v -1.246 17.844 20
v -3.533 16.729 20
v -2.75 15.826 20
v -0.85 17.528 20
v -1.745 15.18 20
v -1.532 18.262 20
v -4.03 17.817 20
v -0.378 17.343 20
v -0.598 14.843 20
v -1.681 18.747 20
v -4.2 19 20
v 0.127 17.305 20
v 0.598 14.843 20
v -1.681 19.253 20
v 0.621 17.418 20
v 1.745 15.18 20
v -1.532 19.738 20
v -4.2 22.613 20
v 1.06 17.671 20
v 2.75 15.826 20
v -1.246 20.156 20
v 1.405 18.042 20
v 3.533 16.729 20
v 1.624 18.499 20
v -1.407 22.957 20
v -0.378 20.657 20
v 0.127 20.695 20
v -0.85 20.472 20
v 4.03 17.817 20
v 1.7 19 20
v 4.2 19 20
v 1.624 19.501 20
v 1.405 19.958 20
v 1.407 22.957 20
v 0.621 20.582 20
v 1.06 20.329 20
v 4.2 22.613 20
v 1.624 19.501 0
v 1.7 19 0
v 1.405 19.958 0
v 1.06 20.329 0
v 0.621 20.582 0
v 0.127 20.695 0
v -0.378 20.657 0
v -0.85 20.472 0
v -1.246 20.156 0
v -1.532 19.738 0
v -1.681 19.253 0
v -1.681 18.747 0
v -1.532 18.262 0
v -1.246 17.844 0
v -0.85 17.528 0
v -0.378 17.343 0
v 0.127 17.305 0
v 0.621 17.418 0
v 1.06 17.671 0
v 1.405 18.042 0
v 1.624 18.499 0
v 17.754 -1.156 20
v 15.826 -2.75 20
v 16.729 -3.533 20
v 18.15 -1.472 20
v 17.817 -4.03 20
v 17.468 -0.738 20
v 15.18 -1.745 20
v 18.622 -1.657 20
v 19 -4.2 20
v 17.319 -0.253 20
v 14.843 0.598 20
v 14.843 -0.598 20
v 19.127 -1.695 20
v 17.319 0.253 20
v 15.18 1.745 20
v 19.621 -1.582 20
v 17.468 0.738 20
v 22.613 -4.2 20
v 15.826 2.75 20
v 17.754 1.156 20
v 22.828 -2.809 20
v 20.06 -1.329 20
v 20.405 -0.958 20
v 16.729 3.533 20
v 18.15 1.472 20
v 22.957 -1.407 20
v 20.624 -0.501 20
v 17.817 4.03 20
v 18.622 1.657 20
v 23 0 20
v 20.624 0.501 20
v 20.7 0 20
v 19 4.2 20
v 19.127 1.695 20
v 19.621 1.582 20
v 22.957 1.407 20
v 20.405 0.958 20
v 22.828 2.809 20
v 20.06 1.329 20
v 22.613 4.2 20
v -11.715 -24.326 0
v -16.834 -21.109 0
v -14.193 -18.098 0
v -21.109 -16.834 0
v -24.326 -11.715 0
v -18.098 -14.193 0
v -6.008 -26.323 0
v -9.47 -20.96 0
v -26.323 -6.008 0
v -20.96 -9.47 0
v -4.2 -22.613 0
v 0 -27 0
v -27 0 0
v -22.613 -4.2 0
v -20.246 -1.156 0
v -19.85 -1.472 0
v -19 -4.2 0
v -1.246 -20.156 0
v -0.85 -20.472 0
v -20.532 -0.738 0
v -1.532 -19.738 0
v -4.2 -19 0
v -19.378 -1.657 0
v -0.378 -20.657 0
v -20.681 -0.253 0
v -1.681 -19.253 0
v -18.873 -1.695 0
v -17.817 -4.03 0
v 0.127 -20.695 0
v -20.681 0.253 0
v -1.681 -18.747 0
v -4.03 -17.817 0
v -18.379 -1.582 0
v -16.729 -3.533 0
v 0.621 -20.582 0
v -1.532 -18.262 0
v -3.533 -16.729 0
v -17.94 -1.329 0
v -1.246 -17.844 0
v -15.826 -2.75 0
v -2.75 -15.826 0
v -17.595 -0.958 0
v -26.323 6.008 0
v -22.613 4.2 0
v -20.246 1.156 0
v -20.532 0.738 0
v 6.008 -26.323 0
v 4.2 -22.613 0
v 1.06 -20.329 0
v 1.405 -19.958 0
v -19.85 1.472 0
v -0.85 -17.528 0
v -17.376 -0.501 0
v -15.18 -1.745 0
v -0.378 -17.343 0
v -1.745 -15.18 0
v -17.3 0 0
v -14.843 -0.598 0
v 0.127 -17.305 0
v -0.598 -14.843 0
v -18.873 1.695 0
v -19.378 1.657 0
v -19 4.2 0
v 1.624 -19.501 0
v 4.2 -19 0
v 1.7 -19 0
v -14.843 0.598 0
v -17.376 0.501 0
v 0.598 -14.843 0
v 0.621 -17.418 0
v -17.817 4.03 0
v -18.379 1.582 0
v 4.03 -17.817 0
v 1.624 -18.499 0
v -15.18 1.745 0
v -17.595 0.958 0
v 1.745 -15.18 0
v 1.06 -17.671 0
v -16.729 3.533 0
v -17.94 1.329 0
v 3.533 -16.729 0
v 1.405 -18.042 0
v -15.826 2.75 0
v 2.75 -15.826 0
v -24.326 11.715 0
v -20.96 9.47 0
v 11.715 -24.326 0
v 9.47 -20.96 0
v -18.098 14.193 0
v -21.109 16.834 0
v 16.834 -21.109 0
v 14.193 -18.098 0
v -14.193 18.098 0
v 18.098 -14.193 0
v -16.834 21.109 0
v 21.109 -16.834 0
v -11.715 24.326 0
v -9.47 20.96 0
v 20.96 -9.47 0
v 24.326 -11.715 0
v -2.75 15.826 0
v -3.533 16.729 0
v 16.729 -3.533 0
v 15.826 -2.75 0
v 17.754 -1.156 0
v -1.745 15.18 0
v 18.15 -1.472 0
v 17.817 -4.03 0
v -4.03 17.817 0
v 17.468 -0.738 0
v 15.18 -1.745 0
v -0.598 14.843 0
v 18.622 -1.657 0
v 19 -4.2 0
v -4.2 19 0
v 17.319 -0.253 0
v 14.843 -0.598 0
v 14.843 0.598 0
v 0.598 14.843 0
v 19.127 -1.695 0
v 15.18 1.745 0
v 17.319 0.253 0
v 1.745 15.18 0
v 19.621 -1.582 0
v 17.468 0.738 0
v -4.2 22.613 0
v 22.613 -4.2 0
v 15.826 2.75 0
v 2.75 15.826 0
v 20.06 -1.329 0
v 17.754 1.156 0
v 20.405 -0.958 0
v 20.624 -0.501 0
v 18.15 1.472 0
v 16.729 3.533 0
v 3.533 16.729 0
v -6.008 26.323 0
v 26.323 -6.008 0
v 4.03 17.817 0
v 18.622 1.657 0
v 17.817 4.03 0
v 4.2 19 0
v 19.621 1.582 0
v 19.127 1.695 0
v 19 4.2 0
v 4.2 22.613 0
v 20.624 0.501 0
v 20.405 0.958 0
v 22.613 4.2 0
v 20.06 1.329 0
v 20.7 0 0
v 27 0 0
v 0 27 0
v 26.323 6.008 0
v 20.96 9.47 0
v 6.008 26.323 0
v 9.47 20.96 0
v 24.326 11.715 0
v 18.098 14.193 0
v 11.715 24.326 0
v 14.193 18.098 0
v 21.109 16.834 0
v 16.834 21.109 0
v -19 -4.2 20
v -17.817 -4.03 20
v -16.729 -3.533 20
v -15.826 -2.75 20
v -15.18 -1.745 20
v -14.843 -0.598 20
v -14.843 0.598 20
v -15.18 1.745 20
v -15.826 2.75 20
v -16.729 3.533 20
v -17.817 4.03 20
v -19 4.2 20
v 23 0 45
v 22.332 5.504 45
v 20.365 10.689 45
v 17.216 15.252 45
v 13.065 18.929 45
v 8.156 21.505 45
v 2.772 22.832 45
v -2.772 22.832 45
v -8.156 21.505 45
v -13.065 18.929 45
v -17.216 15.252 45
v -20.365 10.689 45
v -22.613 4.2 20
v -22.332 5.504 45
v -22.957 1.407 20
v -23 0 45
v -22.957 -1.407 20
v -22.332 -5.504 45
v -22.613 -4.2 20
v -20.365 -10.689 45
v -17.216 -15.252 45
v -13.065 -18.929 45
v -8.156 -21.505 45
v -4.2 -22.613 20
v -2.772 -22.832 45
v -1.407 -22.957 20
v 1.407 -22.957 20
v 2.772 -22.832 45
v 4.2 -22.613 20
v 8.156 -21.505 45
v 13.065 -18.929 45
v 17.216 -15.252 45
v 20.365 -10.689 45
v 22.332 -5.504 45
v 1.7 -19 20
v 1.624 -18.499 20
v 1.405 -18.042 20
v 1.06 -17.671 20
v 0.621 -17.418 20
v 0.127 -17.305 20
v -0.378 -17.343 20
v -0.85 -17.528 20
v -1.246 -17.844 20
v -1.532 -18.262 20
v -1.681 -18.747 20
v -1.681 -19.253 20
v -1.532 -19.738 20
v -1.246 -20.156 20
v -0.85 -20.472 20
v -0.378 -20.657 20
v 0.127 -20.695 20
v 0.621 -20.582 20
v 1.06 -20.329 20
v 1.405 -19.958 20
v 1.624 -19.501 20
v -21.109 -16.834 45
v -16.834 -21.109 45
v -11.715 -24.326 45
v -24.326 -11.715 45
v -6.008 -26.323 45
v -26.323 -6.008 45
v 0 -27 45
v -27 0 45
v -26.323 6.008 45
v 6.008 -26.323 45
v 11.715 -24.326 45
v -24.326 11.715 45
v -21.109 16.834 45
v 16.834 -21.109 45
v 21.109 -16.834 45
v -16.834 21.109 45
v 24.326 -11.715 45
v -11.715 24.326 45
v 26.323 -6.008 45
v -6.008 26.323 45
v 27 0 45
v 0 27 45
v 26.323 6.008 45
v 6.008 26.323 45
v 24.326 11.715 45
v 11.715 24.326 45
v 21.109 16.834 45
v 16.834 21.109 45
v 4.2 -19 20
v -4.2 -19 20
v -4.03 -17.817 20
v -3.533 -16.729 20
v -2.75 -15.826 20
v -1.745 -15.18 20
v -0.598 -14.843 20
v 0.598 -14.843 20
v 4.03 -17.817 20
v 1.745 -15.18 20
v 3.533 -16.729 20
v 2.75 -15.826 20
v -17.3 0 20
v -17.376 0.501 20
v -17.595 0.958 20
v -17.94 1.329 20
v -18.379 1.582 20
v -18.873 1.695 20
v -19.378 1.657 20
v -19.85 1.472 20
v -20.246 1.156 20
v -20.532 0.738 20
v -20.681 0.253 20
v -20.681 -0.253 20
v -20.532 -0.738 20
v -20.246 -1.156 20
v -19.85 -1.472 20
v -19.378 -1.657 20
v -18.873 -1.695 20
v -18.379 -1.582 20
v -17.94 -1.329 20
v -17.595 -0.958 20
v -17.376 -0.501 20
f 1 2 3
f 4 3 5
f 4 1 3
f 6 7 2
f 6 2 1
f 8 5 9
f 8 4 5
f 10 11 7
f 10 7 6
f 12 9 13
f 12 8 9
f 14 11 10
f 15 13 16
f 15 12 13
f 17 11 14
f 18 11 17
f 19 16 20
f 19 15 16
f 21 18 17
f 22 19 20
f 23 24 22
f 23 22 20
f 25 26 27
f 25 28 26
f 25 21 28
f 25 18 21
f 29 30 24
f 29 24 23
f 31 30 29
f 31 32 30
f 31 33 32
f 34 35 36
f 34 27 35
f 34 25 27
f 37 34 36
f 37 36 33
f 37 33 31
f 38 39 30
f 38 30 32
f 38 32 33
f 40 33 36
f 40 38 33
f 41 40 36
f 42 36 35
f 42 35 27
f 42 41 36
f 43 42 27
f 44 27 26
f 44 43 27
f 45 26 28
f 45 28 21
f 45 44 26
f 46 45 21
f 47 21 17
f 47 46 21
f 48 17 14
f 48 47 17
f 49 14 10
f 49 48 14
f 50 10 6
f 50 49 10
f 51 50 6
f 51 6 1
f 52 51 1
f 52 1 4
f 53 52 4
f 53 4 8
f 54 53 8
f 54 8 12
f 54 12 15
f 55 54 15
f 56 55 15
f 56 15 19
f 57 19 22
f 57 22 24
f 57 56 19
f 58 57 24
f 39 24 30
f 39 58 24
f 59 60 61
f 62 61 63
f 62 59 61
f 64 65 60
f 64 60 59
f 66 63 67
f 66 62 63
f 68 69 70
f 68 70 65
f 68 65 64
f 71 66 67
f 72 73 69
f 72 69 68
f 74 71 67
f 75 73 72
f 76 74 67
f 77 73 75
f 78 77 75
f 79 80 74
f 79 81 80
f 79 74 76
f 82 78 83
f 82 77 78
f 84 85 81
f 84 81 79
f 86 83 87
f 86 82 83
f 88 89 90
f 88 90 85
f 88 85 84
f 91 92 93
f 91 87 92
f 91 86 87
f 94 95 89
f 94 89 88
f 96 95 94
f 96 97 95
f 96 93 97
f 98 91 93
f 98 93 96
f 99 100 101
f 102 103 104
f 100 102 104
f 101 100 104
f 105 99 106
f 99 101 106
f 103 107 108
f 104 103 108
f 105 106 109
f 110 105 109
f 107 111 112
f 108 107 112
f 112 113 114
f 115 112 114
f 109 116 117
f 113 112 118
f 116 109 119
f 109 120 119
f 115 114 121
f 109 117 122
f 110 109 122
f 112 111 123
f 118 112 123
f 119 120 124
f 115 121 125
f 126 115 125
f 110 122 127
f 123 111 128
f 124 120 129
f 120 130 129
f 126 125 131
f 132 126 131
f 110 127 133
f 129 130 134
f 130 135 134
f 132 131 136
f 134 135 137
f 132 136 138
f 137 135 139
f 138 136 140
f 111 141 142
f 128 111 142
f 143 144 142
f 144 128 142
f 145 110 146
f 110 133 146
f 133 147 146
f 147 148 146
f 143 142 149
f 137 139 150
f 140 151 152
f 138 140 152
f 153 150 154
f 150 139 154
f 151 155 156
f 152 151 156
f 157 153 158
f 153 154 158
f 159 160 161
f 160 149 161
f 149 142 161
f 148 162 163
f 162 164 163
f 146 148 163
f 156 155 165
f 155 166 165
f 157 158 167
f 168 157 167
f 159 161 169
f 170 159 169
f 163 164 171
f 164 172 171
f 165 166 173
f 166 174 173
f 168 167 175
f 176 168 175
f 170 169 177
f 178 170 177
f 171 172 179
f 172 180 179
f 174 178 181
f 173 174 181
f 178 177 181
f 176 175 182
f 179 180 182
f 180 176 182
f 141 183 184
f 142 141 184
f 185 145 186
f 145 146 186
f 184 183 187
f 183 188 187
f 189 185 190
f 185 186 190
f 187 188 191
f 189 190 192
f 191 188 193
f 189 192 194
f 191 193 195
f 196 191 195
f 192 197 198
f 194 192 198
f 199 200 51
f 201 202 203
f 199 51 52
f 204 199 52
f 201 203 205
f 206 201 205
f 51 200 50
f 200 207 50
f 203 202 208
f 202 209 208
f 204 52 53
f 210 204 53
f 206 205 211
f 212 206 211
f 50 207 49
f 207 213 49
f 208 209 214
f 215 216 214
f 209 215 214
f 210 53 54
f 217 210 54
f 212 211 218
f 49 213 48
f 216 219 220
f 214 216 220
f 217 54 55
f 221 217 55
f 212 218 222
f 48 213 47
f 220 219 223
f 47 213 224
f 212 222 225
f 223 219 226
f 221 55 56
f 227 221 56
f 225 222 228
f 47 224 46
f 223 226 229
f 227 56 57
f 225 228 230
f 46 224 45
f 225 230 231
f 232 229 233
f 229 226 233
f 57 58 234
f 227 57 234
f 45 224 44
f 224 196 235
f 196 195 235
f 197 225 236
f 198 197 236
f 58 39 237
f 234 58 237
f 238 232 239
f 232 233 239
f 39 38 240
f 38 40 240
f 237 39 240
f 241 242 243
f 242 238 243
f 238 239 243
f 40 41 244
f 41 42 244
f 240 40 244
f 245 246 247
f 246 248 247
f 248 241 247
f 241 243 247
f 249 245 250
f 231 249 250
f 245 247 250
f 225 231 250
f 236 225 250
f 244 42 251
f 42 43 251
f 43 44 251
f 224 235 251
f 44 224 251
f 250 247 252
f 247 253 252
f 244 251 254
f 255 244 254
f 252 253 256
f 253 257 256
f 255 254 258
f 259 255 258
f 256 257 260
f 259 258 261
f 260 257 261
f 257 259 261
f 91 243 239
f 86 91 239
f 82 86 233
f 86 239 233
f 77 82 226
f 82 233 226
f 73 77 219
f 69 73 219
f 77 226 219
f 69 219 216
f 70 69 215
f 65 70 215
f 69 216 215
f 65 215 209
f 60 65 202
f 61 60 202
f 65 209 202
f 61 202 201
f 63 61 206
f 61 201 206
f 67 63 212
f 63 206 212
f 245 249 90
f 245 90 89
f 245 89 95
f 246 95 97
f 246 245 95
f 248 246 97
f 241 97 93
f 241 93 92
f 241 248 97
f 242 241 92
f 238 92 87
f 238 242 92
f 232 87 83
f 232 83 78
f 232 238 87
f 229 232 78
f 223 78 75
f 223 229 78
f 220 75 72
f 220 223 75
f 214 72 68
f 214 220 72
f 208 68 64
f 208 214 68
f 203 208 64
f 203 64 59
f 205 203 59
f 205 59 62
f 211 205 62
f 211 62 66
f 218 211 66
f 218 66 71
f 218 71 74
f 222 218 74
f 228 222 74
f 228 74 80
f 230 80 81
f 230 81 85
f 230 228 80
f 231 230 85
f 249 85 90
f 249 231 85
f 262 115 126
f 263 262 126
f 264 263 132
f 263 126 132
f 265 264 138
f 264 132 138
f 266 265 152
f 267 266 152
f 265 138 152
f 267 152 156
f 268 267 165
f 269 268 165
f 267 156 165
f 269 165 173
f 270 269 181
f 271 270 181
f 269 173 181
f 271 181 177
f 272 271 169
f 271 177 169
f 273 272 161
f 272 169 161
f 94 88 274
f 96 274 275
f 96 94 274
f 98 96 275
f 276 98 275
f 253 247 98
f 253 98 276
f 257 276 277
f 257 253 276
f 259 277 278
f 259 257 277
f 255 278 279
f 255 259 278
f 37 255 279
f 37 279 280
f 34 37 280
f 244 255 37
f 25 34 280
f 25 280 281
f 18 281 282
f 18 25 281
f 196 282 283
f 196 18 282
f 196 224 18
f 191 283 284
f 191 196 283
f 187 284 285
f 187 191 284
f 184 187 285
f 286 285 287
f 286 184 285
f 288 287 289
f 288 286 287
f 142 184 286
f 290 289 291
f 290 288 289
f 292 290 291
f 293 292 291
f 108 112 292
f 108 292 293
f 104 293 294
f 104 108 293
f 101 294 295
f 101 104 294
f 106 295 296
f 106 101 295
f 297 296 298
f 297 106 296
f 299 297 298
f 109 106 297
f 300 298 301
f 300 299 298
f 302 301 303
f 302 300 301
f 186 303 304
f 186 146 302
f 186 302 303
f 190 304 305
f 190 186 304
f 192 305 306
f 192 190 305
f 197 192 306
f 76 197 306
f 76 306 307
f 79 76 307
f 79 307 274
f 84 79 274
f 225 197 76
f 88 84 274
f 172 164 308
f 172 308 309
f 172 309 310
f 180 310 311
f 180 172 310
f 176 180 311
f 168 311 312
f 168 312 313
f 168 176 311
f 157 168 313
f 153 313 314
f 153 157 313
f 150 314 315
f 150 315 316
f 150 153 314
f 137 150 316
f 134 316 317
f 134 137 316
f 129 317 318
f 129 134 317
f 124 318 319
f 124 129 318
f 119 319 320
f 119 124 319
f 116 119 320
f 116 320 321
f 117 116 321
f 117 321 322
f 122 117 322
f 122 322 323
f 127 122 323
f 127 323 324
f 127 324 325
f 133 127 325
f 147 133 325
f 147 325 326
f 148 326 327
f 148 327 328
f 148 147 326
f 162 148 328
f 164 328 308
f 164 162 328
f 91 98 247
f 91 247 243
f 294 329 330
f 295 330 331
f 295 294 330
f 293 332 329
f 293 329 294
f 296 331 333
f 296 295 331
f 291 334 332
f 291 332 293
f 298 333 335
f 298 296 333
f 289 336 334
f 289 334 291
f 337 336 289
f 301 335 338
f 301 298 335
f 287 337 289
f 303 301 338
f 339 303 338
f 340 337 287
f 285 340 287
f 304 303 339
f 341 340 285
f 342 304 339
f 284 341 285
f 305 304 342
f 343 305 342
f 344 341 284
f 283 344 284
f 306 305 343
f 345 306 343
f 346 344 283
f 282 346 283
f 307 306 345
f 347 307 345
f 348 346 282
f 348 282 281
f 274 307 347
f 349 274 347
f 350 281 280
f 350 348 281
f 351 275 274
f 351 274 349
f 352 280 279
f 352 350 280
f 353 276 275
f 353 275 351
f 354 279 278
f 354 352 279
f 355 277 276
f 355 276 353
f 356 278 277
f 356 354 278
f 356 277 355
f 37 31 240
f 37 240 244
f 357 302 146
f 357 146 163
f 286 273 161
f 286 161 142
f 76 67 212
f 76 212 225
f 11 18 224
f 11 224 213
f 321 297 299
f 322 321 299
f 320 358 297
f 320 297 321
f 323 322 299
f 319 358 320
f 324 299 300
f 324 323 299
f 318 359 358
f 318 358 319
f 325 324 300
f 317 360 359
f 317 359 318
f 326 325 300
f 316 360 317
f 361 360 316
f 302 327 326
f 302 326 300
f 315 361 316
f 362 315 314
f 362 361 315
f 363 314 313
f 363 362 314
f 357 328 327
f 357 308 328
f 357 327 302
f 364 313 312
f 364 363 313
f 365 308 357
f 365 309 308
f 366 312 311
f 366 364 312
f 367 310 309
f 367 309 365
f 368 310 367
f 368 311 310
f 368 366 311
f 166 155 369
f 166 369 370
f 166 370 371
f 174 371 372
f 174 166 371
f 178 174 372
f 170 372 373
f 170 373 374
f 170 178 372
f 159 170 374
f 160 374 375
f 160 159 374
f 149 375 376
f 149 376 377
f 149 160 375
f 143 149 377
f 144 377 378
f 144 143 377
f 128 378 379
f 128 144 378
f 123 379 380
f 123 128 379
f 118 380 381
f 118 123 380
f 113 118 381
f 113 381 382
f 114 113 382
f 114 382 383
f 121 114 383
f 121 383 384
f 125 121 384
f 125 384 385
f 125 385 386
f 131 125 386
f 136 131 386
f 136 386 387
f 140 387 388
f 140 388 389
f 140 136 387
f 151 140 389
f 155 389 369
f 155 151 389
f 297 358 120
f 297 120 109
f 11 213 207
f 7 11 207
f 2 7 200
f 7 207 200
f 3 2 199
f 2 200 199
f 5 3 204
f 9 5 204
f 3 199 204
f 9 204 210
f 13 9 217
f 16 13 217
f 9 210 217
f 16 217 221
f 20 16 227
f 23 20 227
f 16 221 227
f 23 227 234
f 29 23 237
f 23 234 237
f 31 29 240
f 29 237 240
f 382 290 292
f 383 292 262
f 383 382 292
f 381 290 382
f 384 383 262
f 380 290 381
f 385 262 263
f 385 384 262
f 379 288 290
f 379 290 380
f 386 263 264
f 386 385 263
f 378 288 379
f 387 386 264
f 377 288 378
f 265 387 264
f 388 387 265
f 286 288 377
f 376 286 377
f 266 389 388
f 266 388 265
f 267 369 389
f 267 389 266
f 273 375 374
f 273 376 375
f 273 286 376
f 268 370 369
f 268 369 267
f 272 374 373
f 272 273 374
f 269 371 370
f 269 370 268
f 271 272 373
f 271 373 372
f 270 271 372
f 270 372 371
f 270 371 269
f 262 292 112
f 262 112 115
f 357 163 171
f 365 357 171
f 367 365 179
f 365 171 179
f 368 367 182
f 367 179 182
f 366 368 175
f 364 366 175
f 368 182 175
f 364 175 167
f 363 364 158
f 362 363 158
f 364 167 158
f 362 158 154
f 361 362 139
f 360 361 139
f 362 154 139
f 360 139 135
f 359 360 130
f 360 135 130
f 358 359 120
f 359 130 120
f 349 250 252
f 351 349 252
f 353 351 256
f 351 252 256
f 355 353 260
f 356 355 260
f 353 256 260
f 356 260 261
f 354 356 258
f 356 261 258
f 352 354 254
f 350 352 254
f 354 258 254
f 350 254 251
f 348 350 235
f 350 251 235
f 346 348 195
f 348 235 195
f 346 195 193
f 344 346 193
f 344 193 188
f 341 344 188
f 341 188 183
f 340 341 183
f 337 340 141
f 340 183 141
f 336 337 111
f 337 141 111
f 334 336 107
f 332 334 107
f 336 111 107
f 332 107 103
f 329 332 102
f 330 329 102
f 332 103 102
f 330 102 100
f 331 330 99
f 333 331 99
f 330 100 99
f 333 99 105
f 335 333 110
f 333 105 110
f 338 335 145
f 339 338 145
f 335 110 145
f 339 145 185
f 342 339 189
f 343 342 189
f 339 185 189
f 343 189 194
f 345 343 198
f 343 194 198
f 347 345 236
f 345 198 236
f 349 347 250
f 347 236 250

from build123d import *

# Parameters (mm, degrees)
SKETCH1_R           = 27
BOSS_EXTRUDE1_DEPTH = 45
SKETCH1_3_R         = 1.7
BOSS_EXTRUDE2_DEPTH = 20


with BuildPart() as part:
    # Sketch1 → Boss-Extrude1 (new body)
    with BuildSketch(Plane.XY):
        Circle(SKETCH1_R)
        with BuildLine():
            ThreePointArc((-22.61327044, 4.2), (-16.263455967, 16.263455967), (-4.2, 22.61327044))
            ThreePointArc((-4.2, 22.61327044), (0, 23), (4.2, 22.61327044))
            ThreePointArc((4.2, 22.61327044), (16.263455967, 16.263455967), (22.61327044, 4.2))
            ThreePointArc((22.61327044, 4.2), (22.903113545, 2.108883576), (23, 0))
            ThreePointArc((23, 0), (22.903113545, -2.108883576), (22.61327044, -4.2))
            ThreePointArc((22.61327044, -4.2), (16.263455967, -16.263455967), (4.2, -22.61327044))
            ThreePointArc((4.2, -22.61327044), (0, -23), (-4.2, -22.61327044))
            ThreePointArc((-4.2, -22.61327044), (-16.263455967, -16.263455967), (-22.61327044, -4.2))
            ThreePointArc((-22.61327044, -4.2), (-23, 0), (-22.61327044, 4.2))
        make_face(mode=Mode.SUBTRACT)
    extrude(amount=BOSS_EXTRUDE1_DEPTH)

    # Sketch1<3> → Boss-Extrude2 (add)
    # profile 1 of 4: a face of its own
    with BuildSketch(Plane.XY):
        with BuildLine():
            Line((-4.2, 22.61327044), (-4.2, 19))
            ThreePointArc((-4.2, 19), (0, 14.8), (4.2, 19))
            Line((4.2, 19), (4.2, 22.61327044))
            ThreePointArc((4.2, 22.61327044), (0, 23), (-4.2, 22.61327044))
        make_face()
        with Locations((0, 19)):
            Circle(SKETCH1_3_R, mode=Mode.SUBTRACT)
    # profile 2 of 4: a face of its own
    with BuildSketch(Plane.XY):
        with BuildLine():
            Line((-19, 4.2), (-22.61327044, 4.2))
            ThreePointArc((-22.61327044, 4.2), (-23, 0), (-22.61327044, -4.2))
            Line((-22.61327044, -4.2), (-19, -4.2))
            ThreePointArc((-19, -4.2), (-14.8, 0), (-19, 4.2))
        make_face()
        with Locations((-19, 0)):
            Circle(SKETCH1_3_R, mode=Mode.SUBTRACT)
    # profile 3 of 4: a face of its own
    with BuildSketch(Plane.XY):
        with BuildLine():
            ThreePointArc((22.61327044, -4.2), (23, 0), (22.61327044, 4.2))
            Line((22.61327044, 4.2), (19, 4.2))
            ThreePointArc((19, 4.2), (14.8, 0), (19, -4.2))
            Line((19, -4.2), (22.61327044, -4.2))
        make_face()
        with Locations((19, 0)):
            Circle(SKETCH1_3_R, mode=Mode.SUBTRACT)
    # profile 4 of 4: a face of its own
    with BuildSketch(Plane.XY):
        with BuildLine():
            Line((-4.2, -19), (-4.2, -22.61327044))
            ThreePointArc((-4.2, -22.61327044), (0, -23), (4.2, -22.61327044))
            Line((4.2, -22.61327044), (4.2, -19))
            ThreePointArc((4.2, -19), (0, -14.8), (-4.2, -19))
        make_face()
        with Locations((0, -19)):
            Circle(SKETCH1_3_R, mode=Mode.SUBTRACT)
    extrude(amount=BOSS_EXTRUDE2_DEPTH)


solid = part.part
